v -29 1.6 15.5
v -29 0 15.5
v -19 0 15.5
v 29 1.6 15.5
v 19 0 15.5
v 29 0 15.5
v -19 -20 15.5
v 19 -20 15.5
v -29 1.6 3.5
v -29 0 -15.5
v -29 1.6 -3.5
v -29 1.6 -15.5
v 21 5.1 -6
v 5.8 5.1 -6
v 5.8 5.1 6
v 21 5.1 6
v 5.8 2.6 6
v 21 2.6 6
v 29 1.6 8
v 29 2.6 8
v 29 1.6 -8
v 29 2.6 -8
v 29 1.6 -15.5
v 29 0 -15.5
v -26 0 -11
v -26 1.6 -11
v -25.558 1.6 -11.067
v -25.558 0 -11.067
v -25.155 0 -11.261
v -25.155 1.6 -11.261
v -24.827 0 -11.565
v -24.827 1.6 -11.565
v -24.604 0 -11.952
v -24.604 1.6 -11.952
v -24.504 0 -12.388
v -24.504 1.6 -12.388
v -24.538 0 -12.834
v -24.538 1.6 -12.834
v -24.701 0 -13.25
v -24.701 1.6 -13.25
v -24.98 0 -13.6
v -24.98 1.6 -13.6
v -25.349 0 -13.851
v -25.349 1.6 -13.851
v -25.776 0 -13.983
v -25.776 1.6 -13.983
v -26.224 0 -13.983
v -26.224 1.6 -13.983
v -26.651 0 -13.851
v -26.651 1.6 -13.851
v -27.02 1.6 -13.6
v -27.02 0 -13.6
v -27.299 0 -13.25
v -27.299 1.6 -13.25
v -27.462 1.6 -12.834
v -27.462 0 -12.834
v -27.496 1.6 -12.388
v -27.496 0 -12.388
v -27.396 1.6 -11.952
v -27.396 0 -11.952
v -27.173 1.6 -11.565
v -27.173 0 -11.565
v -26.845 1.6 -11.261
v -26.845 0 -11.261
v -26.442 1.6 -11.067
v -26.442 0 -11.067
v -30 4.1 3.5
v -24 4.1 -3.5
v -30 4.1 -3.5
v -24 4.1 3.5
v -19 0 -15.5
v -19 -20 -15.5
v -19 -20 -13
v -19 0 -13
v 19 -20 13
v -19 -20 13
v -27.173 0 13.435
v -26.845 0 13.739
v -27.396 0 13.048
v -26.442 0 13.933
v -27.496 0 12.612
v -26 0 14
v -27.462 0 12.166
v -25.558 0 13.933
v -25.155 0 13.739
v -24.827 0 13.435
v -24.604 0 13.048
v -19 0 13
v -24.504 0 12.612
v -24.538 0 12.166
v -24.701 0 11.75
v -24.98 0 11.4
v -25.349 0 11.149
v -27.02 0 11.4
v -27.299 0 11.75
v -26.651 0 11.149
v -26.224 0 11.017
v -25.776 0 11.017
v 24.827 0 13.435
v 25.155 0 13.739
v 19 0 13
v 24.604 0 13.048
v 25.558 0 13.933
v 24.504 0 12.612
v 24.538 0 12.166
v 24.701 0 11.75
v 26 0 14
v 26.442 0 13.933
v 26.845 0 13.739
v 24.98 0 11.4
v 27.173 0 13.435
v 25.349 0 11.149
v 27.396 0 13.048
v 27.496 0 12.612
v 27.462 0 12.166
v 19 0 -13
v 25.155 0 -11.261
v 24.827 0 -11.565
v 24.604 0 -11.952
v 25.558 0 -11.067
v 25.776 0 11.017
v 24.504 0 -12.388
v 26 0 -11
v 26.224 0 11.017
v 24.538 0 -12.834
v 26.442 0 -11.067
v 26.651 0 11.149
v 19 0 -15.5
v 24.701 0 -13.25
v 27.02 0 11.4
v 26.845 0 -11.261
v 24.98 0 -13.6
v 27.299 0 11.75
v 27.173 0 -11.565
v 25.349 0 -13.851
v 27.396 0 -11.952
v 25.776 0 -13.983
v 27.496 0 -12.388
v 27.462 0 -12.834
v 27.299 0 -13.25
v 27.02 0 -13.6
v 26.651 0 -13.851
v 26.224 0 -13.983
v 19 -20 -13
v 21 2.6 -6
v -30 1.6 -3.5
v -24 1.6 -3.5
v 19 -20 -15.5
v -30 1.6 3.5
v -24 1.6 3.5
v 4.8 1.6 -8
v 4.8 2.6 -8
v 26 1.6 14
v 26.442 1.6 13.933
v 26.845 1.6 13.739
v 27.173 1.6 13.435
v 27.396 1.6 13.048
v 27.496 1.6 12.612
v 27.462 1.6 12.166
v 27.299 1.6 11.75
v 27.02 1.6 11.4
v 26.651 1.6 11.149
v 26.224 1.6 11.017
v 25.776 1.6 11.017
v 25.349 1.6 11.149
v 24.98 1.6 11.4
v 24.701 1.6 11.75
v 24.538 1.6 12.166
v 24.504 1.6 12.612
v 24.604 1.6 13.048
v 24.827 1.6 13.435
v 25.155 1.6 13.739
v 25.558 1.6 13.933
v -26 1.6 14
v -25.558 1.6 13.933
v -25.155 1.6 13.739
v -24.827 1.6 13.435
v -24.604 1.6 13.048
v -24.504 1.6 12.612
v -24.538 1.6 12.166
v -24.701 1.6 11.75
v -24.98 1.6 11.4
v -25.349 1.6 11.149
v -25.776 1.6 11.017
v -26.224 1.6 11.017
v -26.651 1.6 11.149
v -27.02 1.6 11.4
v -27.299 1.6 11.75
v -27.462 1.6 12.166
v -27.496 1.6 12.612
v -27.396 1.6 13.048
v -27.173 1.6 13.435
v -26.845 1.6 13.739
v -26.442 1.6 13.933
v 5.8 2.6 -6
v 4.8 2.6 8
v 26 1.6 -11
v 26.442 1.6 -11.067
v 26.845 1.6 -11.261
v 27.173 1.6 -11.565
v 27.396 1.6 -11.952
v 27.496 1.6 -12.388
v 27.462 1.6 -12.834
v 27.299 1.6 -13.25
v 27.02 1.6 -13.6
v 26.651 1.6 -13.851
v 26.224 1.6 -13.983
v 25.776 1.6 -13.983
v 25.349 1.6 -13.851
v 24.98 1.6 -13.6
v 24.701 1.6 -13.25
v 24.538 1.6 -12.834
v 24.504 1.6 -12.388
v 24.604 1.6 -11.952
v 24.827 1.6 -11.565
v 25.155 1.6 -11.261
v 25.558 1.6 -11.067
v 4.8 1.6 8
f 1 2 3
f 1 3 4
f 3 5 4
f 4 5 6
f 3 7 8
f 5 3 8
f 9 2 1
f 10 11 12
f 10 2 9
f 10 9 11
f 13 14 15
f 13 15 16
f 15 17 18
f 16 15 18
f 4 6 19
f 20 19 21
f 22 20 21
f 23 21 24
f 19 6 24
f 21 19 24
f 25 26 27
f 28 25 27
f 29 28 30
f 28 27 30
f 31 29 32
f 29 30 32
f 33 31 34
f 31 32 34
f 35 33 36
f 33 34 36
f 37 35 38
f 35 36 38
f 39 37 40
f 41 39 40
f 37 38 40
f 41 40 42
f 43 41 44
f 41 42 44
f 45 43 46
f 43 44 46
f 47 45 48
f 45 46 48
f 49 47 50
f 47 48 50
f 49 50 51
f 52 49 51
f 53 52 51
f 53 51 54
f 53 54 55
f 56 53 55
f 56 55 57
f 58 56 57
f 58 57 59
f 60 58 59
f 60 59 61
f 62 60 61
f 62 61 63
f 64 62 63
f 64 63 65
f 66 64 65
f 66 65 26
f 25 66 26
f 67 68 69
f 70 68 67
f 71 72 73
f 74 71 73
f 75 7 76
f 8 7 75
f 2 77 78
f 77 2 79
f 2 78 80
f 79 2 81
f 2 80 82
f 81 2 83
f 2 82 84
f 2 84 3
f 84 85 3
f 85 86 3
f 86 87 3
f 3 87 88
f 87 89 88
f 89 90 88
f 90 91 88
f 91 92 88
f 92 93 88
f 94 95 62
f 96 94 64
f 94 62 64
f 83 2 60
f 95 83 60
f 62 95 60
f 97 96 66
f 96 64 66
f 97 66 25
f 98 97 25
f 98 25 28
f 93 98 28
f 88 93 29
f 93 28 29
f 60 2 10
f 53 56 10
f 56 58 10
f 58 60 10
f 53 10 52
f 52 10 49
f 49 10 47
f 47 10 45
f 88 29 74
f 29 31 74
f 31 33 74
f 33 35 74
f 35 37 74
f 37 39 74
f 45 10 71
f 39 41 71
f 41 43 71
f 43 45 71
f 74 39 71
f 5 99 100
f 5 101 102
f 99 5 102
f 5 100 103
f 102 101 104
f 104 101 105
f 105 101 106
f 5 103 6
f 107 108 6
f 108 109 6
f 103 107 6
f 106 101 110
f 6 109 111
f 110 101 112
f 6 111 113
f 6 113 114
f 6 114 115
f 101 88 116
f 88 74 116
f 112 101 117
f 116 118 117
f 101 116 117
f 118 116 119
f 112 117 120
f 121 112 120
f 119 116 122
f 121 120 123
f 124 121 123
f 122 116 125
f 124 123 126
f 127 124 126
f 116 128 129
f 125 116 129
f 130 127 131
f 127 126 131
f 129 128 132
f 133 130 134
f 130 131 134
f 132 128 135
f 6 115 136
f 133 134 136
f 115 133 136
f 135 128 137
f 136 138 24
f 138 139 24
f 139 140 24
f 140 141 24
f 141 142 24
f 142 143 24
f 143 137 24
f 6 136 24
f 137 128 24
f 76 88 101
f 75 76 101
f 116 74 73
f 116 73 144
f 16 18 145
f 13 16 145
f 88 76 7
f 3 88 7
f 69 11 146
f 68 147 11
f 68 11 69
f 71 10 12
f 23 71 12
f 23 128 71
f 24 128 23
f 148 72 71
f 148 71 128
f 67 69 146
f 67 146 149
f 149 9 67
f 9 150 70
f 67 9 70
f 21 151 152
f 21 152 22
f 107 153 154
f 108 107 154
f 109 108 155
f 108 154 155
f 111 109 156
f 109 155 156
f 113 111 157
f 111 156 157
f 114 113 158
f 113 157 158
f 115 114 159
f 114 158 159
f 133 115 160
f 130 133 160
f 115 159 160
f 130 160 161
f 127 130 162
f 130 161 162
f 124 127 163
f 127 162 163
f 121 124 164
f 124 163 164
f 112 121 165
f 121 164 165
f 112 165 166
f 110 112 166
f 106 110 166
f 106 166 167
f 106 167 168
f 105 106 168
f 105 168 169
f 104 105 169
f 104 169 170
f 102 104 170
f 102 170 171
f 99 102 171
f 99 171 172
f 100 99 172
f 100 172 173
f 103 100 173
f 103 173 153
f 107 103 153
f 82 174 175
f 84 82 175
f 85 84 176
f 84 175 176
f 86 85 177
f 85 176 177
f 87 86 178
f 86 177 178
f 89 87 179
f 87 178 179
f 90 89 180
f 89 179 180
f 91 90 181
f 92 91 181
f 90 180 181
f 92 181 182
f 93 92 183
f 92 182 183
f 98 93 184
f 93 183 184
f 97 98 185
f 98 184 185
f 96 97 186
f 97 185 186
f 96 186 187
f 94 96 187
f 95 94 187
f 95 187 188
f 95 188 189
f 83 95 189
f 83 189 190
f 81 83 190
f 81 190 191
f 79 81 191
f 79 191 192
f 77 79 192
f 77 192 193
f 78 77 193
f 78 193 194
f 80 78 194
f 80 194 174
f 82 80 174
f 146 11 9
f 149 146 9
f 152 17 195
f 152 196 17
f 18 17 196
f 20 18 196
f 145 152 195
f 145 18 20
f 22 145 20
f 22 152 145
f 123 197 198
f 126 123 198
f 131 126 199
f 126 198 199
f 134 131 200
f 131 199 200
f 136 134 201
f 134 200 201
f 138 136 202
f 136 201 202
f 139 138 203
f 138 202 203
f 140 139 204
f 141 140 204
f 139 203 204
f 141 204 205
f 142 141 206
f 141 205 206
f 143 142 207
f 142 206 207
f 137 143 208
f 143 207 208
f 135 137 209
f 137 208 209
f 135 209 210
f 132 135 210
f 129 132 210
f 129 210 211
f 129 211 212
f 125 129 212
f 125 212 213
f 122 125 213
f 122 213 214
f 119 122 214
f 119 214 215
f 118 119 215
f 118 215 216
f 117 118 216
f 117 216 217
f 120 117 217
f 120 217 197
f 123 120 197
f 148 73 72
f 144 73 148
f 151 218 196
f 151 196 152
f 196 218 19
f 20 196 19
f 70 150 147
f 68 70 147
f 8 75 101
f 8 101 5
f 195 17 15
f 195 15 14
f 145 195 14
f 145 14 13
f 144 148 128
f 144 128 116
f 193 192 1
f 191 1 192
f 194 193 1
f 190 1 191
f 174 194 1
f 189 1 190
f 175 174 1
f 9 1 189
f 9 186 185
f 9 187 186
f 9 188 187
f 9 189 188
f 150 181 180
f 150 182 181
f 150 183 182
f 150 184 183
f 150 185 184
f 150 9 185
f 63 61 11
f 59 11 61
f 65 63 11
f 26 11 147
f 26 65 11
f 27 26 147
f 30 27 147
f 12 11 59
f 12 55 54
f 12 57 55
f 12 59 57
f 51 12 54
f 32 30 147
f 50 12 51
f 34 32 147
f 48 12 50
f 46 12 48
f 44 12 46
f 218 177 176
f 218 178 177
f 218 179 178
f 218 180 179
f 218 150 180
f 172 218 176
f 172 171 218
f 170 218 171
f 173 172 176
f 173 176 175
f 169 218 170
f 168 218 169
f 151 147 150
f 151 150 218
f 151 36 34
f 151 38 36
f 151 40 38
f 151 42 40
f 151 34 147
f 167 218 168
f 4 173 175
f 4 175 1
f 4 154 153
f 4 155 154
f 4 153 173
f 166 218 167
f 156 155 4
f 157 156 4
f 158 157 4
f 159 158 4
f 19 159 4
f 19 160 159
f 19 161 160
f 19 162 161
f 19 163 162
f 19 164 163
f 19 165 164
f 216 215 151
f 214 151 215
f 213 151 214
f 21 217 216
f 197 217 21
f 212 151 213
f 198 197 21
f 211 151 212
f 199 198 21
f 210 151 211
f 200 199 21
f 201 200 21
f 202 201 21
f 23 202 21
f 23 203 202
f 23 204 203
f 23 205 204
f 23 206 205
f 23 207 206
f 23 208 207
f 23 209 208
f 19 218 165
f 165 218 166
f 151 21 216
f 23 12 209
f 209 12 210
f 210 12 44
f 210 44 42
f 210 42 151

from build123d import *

# Parameters (mm, degrees)
SKETCH1_W          = 58
SKETCH1_H          = 31
CIRCUIT_DEPTH      = 1.6
SKETCH2_W          = 24.2
SKETCH2_H          = 16
ESP_PCB_DEPTH      = 1
SKETCH3_W          = 15.2
SKETCH3_H          = 12
ESP_CHIP_DEPTH     = 2.5
SKETCH4_W          = 5
SKETCH4_H          = 7
PCB_HOLES_DEPTH    = 2.5
SKETCH5_R          = 1.5
CUT_EXTRUDE1_DEPTH = 34.068111528
SKETCH6_W          = 7
SKETCH6_H          = 2.5
USB_DEPTH          = 1
SKETCH7_W          = 38
SKETCH7_H          = 2.5
PINS_DEPTH         = 20


with BuildPart() as part:
    # Sketch1 → CIRCUIT (new body)
    with BuildSketch(Plane(origin=(0, 0, 0), x_dir=(1, 0, 0), z_dir=(0, 1, 0))):
        Rectangle(SKETCH1_W, SKETCH1_H)
    extrude(amount=CIRCUIT_DEPTH)

    # Sketch2 → ESP_PCB (add)
    with BuildSketch(Plane(origin=(0, 1.6, 0), x_dir=(1, 0, 0), z_dir=(0, 1, 0))):
        with Locations((16.9, 0)):
            Rectangle(SKETCH2_W, SKETCH2_H)
    extrude(amount=ESP_PCB_DEPTH)

    # Sketch3 → ESP_CHIP (add)
    with BuildSketch(Plane(origin=(0, 2.6, 0), x_dir=(1, 0, 0), z_dir=(0, 1, 0))):
        with Locations((13.4, 0)):
            Rectangle(SKETCH3_W, SKETCH3_H)
    extrude(amount=ESP_CHIP_DEPTH)

    # Sketch4 → PCB_HOLES (add)
    with BuildSketch(Plane(origin=(0, 1.6, 0), x_dir=(1, 0, 0), z_dir=(0, 1, 0))):
        with Locations((-26.5, 0)):
            Rectangle(SKETCH4_W, SKETCH4_H)
    extrude(amount=PCB_HOLES_DEPTH)

    # Sketch5 → Cut-Extrude1 (cut, through all)
    with BuildSketch(Plane(origin=(0, 1.6, 0), x_dir=(1, 0, 0), z_dir=(0, 1, 0))):
        with Locations(Location((-26, 12.5, 0), (0, 0, 270))):
            Circle(SKETCH5_R)
        with Locations(Location((-26, -12.5, 0), (0, 0, 270))):
            Circle(SKETCH5_R)
        with Locations(Location((26, 12.5, 0), (0, 0, 270))):
            Circle(SKETCH5_R)
        with Locations(Location((26, -12.5, 0), (0, 0, 270))):
            Circle(SKETCH5_R)
    extrude(amount=-CUT_EXTRUDE1_DEPTH, mode=Mode.SUBTRACT)

    # Sketch6 → USB (add)
    with BuildSketch(Plane.ZY.offset(29)):
        with Locations((0, 2.85)):
            Rectangle(SKETCH6_W, SKETCH6_H)
    extrude(amount=USB_DEPTH)

    # Sketch7 → PINS (add)
    with BuildSketch(Plane.XZ):
        with Locations((0, 14.25)):
            Rectangle(SKETCH7_W, SKETCH7_H)
        with Locations((0, -14.25)):
            Rectangle(SKETCH7_W, SKETCH7_H)
    extrude(amount=PINS_DEPTH)


solid = part.part
